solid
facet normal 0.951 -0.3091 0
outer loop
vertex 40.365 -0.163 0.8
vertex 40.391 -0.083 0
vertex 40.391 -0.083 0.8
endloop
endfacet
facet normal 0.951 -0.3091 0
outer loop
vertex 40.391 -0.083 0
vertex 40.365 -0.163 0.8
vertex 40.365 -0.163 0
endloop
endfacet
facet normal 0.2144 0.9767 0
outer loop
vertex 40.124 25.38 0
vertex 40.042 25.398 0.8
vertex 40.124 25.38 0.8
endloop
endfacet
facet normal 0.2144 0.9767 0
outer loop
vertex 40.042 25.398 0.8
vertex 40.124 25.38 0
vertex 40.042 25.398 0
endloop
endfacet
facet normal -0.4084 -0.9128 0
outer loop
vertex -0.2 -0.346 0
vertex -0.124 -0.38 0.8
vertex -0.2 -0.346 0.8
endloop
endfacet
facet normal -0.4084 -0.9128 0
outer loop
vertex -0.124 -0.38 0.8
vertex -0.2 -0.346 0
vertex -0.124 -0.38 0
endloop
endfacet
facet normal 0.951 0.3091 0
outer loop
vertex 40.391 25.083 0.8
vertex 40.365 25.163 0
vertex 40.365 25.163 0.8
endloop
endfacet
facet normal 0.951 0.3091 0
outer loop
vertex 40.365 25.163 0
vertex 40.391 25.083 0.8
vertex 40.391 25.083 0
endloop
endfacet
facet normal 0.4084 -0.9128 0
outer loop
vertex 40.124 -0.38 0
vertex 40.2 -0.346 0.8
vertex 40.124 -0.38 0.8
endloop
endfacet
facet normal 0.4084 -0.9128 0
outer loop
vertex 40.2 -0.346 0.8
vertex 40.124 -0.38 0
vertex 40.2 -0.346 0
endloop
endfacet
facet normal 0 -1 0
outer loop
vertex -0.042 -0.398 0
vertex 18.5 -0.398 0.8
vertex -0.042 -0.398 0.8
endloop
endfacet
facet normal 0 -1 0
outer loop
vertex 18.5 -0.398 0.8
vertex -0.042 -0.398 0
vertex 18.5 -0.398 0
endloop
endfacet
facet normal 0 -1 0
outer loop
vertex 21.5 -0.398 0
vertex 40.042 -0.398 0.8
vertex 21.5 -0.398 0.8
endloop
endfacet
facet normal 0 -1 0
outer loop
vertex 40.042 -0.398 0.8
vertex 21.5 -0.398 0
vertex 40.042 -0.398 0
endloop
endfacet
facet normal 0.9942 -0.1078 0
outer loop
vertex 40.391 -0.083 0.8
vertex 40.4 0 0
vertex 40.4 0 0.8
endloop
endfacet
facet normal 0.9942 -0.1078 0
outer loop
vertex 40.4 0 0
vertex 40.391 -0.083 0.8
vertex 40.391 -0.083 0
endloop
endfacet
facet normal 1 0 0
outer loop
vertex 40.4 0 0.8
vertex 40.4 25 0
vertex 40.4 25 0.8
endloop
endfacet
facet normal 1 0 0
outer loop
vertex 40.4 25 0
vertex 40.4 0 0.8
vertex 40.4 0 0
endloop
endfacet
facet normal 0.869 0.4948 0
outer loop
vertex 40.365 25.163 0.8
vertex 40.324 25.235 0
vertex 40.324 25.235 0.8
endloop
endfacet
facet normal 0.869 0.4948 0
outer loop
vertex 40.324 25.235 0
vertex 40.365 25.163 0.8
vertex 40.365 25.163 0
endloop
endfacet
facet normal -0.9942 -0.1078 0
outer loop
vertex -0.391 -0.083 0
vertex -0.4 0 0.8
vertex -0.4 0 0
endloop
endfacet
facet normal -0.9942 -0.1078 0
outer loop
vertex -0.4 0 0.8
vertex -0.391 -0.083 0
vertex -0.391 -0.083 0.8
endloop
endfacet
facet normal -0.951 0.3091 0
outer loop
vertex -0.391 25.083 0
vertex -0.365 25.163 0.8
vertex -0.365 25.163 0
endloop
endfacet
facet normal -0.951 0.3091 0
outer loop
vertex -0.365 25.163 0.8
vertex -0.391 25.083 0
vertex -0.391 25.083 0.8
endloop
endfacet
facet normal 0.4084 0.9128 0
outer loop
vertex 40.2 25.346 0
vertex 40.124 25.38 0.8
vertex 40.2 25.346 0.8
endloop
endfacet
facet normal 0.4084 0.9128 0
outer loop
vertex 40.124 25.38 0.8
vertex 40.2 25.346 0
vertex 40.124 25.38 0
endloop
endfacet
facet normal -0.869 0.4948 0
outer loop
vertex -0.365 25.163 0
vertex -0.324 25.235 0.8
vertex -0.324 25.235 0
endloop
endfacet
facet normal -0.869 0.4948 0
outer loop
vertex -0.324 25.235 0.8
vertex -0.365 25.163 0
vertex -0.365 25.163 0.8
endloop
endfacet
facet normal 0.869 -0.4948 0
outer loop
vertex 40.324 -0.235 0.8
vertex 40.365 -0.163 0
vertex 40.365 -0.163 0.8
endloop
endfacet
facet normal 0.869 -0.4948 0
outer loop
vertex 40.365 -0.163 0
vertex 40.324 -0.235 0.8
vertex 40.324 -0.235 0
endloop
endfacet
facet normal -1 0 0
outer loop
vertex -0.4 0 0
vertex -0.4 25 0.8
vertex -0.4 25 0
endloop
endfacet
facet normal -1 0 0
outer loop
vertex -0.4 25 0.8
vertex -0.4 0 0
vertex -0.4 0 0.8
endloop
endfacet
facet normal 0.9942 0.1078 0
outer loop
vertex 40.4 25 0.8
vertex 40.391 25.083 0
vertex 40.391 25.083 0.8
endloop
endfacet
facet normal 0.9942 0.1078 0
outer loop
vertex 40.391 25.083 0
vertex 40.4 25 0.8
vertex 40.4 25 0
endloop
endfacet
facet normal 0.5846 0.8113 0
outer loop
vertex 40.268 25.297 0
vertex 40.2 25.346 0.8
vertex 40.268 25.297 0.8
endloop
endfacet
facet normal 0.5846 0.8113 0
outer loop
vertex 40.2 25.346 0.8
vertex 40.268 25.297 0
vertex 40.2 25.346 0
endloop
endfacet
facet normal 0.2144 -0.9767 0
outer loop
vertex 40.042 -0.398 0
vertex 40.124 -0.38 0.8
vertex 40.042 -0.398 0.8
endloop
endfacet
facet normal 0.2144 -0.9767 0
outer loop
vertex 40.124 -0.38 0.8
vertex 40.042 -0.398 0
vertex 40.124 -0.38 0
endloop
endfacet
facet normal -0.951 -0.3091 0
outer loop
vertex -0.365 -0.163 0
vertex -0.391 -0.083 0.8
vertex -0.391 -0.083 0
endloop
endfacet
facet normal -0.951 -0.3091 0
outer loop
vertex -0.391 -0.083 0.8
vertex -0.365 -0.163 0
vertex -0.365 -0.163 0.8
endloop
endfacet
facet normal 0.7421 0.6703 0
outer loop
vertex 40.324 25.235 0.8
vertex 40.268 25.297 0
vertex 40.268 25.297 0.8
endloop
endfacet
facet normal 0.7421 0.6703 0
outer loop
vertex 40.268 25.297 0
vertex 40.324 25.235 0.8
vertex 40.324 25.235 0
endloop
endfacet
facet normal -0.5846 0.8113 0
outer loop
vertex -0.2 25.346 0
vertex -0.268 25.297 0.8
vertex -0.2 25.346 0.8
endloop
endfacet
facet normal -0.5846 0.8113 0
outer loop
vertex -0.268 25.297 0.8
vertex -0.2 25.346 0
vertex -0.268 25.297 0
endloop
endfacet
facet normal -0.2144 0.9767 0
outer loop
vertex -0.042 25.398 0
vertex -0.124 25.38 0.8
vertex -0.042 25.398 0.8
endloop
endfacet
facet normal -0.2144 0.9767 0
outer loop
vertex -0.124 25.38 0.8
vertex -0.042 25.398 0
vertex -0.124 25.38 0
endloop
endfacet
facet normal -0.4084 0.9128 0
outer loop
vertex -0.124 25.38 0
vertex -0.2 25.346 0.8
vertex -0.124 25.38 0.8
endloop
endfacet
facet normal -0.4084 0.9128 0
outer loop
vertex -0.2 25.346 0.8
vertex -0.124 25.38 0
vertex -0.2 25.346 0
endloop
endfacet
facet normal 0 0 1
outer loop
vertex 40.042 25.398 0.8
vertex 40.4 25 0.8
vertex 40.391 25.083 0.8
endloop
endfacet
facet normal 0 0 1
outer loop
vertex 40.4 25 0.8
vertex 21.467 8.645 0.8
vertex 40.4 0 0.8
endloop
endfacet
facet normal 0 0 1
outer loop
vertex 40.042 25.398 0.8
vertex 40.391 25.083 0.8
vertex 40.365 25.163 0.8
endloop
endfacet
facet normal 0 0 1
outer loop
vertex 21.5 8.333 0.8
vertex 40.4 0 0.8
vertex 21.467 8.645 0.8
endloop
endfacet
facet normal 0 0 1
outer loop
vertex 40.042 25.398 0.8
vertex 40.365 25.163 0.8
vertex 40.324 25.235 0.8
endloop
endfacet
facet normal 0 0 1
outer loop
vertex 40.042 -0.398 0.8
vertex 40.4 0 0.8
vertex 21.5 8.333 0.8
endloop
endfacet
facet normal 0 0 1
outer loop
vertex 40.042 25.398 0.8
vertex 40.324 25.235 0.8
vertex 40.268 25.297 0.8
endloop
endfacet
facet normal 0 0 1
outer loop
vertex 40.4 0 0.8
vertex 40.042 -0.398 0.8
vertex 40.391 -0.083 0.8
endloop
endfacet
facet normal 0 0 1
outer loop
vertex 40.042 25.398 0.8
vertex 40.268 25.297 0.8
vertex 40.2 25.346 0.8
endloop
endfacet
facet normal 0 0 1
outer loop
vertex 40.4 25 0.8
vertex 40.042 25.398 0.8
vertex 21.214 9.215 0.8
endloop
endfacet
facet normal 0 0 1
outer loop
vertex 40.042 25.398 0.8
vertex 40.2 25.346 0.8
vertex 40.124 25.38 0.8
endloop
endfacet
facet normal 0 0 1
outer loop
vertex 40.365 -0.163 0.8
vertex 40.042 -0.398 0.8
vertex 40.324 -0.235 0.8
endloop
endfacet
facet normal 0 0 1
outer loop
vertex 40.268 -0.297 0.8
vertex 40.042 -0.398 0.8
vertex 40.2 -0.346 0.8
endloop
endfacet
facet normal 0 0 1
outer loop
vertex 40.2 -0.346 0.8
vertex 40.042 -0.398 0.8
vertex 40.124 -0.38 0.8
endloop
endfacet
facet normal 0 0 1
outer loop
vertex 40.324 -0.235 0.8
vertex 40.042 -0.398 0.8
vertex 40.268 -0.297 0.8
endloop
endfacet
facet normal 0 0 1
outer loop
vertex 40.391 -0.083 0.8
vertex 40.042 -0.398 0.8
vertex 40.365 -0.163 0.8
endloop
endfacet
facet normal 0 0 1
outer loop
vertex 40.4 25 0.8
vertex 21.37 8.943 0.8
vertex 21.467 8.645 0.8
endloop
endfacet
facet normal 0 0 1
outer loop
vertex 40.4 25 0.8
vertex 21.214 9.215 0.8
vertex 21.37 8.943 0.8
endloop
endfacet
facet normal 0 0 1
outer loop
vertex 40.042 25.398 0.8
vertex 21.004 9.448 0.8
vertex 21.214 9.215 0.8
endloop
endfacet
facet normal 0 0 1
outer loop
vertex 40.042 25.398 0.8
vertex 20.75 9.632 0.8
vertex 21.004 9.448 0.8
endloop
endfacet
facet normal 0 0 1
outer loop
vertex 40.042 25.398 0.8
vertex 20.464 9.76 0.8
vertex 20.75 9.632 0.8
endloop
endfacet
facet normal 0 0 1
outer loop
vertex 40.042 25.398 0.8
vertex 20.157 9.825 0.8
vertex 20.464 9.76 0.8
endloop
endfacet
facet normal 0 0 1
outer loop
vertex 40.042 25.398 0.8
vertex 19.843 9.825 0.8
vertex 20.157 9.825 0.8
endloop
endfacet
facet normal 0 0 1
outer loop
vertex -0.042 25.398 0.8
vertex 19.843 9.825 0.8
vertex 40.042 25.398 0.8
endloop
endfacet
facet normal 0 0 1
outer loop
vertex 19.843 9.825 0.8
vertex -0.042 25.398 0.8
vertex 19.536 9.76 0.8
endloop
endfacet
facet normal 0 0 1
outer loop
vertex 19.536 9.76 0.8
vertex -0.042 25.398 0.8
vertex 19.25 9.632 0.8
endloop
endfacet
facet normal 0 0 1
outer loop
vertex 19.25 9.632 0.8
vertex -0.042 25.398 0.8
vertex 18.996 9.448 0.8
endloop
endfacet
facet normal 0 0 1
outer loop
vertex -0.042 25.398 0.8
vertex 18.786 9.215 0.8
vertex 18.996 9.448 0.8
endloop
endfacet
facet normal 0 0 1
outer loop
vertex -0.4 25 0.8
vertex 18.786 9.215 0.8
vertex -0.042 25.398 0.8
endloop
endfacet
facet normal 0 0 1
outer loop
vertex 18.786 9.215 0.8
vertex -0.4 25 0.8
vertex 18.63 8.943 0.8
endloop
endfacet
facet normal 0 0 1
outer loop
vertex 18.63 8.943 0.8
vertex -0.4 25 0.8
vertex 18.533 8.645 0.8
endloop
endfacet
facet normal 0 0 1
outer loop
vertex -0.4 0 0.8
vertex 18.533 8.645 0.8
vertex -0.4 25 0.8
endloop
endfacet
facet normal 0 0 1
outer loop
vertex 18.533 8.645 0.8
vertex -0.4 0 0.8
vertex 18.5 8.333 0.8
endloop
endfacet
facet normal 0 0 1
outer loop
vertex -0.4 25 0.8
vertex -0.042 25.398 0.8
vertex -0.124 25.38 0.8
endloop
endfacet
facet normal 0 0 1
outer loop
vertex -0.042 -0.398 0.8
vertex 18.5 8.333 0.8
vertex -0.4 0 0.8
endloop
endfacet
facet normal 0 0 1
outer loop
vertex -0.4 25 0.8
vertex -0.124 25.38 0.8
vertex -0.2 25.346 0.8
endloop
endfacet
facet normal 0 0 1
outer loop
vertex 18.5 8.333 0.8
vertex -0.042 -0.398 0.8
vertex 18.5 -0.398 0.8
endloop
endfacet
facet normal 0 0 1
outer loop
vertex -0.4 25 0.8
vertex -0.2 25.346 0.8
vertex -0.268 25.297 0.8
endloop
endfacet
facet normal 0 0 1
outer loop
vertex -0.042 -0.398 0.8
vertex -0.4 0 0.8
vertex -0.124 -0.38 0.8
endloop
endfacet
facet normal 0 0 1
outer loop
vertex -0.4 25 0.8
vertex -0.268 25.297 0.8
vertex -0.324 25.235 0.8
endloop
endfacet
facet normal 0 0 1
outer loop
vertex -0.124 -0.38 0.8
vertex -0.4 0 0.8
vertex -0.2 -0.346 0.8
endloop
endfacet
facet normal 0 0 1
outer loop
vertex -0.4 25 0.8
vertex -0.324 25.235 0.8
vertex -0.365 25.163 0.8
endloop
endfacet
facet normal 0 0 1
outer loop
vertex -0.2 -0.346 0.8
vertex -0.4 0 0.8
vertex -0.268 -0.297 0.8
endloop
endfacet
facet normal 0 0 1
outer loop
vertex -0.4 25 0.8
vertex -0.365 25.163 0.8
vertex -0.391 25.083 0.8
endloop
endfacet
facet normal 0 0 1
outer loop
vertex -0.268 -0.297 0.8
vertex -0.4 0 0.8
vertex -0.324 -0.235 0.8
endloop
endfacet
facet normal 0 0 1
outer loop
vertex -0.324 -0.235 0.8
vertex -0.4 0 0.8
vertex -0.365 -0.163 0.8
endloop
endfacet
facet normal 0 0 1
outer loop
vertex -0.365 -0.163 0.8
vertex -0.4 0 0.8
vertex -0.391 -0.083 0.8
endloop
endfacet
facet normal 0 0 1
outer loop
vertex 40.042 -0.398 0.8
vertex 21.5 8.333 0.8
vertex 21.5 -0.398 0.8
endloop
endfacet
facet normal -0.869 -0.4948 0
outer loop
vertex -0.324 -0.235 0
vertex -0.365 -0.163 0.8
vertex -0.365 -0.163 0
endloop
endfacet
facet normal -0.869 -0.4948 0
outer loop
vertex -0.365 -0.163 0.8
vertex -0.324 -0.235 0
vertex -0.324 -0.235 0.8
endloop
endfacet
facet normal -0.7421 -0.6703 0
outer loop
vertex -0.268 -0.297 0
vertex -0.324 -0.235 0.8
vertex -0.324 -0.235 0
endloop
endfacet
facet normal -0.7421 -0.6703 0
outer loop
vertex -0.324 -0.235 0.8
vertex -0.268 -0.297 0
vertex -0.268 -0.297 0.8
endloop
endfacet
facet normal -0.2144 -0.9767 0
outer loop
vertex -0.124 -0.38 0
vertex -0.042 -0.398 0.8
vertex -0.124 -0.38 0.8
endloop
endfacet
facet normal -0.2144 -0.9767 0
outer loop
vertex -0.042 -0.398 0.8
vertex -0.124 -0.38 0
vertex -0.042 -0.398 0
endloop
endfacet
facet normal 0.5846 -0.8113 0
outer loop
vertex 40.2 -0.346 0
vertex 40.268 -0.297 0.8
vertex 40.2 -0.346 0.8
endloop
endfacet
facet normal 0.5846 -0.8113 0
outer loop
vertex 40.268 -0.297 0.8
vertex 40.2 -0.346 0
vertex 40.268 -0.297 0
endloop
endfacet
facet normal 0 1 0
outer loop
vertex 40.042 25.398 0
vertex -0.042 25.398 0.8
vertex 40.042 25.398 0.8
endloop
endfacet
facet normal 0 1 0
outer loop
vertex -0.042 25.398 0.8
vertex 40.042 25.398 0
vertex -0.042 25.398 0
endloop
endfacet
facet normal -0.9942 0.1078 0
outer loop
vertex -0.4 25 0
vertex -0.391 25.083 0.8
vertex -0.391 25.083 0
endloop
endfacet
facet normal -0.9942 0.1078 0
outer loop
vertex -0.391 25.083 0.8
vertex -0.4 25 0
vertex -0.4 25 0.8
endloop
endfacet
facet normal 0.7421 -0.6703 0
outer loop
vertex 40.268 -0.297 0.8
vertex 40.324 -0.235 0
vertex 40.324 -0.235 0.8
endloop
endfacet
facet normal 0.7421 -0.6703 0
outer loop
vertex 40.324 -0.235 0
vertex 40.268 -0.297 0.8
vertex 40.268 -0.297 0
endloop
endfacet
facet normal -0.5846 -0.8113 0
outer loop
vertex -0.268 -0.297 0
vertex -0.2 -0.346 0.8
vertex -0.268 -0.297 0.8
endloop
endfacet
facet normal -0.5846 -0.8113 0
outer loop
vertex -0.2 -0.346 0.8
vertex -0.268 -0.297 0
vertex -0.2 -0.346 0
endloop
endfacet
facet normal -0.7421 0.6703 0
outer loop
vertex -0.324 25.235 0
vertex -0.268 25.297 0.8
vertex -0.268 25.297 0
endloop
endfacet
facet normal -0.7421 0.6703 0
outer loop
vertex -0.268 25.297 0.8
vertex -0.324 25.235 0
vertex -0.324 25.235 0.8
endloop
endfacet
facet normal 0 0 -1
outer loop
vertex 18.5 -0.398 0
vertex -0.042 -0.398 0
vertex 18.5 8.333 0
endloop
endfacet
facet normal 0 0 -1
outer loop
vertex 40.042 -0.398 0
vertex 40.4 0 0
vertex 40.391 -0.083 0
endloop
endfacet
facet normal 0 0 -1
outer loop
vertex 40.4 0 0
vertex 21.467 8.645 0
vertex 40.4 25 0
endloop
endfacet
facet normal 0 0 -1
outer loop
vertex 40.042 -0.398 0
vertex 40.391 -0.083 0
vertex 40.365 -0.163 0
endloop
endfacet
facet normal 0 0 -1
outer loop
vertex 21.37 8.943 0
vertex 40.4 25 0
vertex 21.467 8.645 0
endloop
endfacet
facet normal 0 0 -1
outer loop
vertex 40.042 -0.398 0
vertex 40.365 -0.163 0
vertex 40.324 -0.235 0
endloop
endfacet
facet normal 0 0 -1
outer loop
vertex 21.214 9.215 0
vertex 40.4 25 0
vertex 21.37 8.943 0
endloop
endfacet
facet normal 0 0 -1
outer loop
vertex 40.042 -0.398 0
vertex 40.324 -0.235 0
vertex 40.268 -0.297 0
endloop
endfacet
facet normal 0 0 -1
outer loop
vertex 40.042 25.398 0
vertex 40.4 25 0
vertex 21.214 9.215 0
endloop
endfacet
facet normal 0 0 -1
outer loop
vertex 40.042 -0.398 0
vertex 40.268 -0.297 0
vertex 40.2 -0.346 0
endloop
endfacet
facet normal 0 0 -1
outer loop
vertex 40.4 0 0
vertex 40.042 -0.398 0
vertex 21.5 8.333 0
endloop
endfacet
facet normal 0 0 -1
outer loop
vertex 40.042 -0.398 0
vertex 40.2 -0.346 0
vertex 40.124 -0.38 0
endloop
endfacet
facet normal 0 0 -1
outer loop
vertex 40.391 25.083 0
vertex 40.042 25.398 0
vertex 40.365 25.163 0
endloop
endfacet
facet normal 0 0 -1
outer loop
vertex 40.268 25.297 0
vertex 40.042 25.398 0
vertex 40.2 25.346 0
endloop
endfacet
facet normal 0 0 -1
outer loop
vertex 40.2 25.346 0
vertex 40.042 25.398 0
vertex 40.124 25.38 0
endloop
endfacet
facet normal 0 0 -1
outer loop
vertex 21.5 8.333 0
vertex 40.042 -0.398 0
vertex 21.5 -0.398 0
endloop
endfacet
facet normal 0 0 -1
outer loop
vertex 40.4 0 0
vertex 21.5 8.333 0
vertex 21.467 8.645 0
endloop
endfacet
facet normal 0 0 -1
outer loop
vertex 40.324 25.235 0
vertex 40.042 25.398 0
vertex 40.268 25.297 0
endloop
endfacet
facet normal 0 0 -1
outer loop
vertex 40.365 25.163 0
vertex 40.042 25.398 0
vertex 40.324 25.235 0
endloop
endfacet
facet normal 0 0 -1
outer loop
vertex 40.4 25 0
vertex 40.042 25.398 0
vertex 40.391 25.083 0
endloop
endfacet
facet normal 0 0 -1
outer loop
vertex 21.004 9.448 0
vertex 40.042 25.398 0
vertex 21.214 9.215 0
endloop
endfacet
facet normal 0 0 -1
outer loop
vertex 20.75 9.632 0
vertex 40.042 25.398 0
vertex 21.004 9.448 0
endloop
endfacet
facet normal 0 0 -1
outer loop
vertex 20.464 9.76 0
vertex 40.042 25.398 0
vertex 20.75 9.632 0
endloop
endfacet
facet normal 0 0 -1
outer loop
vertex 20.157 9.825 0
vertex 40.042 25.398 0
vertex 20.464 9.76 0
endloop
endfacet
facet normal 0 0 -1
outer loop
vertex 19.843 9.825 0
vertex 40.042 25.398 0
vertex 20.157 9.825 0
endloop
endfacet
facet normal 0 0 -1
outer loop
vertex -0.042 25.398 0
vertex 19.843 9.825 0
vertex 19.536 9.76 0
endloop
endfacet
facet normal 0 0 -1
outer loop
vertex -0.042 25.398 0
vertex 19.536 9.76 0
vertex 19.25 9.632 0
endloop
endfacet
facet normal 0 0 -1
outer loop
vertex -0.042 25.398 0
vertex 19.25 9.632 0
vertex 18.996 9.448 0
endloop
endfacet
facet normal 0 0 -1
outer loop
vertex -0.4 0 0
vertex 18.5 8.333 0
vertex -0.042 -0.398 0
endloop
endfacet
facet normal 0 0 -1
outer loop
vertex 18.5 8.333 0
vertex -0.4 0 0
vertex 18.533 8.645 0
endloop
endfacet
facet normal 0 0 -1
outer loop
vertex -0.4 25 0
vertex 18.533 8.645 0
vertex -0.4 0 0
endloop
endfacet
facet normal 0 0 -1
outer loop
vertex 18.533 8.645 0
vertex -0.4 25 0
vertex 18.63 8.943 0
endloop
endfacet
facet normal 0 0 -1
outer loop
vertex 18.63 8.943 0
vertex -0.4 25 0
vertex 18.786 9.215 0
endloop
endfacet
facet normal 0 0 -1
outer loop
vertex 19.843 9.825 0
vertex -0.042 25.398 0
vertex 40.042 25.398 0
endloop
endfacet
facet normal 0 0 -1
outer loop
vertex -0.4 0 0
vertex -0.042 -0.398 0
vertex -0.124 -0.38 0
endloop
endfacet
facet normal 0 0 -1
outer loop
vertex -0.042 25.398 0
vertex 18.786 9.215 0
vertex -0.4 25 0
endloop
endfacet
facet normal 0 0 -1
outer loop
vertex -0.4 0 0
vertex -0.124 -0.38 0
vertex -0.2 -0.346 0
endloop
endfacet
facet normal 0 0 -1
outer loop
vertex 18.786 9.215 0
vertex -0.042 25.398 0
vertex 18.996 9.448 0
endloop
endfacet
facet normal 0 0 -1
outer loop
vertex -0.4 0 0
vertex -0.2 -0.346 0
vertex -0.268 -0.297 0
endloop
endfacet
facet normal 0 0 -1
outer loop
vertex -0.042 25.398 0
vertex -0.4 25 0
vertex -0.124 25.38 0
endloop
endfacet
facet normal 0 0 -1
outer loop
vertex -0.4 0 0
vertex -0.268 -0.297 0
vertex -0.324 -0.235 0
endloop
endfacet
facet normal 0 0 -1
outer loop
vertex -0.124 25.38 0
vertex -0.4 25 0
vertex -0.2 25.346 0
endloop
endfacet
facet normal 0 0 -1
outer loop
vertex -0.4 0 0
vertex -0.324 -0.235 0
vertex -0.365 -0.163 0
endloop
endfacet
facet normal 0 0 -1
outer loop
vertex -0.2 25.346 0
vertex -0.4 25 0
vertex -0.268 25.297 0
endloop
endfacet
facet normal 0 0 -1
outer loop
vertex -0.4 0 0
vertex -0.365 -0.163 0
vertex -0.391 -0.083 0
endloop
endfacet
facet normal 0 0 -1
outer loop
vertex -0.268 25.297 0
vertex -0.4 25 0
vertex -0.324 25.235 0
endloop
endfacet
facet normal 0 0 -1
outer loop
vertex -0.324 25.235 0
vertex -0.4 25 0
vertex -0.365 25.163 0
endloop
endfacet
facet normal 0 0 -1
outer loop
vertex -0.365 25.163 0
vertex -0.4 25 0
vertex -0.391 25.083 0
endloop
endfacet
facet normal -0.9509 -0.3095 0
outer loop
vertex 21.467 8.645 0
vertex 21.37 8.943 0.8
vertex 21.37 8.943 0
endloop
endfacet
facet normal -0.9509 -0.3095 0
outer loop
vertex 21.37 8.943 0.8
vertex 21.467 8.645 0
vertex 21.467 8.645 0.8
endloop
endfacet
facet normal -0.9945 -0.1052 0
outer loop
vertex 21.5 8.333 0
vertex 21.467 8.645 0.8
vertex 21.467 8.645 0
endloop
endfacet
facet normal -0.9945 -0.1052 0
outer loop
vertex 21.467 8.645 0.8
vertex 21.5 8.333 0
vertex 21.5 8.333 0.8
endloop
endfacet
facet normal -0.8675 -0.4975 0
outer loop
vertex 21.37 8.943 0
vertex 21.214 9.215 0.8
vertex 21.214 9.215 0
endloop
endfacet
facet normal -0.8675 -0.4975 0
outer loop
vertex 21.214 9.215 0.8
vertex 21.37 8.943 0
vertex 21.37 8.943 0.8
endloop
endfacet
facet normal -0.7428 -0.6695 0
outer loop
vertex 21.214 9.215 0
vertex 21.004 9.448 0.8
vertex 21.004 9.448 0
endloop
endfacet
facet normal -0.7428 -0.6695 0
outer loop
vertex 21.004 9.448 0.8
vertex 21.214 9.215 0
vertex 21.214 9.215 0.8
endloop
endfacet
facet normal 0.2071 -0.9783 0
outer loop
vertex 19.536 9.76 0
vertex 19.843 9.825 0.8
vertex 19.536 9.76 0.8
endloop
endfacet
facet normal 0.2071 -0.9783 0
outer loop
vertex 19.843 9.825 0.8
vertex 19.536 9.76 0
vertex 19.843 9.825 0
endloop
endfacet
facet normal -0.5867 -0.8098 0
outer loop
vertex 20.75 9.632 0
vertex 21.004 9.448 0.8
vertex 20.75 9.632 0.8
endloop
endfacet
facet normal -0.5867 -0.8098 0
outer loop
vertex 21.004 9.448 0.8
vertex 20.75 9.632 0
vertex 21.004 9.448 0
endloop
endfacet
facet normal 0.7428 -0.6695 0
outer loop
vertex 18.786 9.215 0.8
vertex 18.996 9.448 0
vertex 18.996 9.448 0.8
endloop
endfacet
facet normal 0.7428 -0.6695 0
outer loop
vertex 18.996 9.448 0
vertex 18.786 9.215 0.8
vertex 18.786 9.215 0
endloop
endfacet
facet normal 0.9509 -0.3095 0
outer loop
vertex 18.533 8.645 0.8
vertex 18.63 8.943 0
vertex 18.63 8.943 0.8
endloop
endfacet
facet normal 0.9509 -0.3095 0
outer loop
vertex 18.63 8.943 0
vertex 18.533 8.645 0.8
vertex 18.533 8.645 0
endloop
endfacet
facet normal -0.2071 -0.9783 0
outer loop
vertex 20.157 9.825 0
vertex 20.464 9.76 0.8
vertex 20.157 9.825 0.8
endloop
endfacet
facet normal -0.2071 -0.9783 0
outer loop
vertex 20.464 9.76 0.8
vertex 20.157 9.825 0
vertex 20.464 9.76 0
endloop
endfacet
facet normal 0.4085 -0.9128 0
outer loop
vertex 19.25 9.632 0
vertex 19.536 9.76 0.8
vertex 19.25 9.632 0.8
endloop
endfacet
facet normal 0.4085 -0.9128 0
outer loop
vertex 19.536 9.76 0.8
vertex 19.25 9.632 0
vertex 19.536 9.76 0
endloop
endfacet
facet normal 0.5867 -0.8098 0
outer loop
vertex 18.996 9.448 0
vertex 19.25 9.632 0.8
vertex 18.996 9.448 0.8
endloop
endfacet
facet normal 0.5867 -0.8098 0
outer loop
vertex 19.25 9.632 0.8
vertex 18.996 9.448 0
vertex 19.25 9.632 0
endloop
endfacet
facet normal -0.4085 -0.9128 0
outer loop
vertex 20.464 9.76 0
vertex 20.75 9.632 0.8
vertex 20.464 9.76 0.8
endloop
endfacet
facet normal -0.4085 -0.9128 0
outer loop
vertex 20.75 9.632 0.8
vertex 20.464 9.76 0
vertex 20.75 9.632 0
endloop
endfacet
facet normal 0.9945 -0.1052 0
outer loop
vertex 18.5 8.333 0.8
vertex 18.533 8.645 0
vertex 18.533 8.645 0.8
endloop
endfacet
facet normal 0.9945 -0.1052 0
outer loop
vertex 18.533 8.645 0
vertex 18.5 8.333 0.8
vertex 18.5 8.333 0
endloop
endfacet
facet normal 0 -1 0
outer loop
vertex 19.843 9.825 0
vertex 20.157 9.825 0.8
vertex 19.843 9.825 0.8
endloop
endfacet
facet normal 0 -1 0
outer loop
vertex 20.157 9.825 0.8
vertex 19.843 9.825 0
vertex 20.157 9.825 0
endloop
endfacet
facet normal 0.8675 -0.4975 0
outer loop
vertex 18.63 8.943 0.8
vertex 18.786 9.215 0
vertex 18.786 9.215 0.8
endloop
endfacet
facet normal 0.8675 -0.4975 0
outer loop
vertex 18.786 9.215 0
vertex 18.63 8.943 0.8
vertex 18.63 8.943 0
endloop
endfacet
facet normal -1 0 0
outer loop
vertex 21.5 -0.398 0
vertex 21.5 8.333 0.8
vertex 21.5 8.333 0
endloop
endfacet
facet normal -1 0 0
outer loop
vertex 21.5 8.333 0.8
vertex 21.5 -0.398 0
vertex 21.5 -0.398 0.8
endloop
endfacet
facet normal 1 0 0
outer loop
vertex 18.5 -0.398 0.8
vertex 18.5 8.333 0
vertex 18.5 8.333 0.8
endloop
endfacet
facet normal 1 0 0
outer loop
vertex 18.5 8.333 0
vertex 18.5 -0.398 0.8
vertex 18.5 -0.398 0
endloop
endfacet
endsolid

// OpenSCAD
$fn=30;
wheel_diameter=30;
card_depth = 0.4;
card_width=wheel_diameter+10;
card_height=wheel_diameter/2 +10;

axel_diameter=3;

difference() {
    minkowski() {
        cube(size = [card_width, card_height, card_depth]);
        cylinder(r=card_depth,h=card_depth);
    }
    translate([card_width/2, card_height/3, -1]) 
        cylinder(r=axel_diameter/2, h=card_depth+2);
        
    translate([card_width/2-axel_diameter/2, -1, -1]) 
        #cube(size = [axel_diameter, card_height/3+1, card_depth+2]);
}
